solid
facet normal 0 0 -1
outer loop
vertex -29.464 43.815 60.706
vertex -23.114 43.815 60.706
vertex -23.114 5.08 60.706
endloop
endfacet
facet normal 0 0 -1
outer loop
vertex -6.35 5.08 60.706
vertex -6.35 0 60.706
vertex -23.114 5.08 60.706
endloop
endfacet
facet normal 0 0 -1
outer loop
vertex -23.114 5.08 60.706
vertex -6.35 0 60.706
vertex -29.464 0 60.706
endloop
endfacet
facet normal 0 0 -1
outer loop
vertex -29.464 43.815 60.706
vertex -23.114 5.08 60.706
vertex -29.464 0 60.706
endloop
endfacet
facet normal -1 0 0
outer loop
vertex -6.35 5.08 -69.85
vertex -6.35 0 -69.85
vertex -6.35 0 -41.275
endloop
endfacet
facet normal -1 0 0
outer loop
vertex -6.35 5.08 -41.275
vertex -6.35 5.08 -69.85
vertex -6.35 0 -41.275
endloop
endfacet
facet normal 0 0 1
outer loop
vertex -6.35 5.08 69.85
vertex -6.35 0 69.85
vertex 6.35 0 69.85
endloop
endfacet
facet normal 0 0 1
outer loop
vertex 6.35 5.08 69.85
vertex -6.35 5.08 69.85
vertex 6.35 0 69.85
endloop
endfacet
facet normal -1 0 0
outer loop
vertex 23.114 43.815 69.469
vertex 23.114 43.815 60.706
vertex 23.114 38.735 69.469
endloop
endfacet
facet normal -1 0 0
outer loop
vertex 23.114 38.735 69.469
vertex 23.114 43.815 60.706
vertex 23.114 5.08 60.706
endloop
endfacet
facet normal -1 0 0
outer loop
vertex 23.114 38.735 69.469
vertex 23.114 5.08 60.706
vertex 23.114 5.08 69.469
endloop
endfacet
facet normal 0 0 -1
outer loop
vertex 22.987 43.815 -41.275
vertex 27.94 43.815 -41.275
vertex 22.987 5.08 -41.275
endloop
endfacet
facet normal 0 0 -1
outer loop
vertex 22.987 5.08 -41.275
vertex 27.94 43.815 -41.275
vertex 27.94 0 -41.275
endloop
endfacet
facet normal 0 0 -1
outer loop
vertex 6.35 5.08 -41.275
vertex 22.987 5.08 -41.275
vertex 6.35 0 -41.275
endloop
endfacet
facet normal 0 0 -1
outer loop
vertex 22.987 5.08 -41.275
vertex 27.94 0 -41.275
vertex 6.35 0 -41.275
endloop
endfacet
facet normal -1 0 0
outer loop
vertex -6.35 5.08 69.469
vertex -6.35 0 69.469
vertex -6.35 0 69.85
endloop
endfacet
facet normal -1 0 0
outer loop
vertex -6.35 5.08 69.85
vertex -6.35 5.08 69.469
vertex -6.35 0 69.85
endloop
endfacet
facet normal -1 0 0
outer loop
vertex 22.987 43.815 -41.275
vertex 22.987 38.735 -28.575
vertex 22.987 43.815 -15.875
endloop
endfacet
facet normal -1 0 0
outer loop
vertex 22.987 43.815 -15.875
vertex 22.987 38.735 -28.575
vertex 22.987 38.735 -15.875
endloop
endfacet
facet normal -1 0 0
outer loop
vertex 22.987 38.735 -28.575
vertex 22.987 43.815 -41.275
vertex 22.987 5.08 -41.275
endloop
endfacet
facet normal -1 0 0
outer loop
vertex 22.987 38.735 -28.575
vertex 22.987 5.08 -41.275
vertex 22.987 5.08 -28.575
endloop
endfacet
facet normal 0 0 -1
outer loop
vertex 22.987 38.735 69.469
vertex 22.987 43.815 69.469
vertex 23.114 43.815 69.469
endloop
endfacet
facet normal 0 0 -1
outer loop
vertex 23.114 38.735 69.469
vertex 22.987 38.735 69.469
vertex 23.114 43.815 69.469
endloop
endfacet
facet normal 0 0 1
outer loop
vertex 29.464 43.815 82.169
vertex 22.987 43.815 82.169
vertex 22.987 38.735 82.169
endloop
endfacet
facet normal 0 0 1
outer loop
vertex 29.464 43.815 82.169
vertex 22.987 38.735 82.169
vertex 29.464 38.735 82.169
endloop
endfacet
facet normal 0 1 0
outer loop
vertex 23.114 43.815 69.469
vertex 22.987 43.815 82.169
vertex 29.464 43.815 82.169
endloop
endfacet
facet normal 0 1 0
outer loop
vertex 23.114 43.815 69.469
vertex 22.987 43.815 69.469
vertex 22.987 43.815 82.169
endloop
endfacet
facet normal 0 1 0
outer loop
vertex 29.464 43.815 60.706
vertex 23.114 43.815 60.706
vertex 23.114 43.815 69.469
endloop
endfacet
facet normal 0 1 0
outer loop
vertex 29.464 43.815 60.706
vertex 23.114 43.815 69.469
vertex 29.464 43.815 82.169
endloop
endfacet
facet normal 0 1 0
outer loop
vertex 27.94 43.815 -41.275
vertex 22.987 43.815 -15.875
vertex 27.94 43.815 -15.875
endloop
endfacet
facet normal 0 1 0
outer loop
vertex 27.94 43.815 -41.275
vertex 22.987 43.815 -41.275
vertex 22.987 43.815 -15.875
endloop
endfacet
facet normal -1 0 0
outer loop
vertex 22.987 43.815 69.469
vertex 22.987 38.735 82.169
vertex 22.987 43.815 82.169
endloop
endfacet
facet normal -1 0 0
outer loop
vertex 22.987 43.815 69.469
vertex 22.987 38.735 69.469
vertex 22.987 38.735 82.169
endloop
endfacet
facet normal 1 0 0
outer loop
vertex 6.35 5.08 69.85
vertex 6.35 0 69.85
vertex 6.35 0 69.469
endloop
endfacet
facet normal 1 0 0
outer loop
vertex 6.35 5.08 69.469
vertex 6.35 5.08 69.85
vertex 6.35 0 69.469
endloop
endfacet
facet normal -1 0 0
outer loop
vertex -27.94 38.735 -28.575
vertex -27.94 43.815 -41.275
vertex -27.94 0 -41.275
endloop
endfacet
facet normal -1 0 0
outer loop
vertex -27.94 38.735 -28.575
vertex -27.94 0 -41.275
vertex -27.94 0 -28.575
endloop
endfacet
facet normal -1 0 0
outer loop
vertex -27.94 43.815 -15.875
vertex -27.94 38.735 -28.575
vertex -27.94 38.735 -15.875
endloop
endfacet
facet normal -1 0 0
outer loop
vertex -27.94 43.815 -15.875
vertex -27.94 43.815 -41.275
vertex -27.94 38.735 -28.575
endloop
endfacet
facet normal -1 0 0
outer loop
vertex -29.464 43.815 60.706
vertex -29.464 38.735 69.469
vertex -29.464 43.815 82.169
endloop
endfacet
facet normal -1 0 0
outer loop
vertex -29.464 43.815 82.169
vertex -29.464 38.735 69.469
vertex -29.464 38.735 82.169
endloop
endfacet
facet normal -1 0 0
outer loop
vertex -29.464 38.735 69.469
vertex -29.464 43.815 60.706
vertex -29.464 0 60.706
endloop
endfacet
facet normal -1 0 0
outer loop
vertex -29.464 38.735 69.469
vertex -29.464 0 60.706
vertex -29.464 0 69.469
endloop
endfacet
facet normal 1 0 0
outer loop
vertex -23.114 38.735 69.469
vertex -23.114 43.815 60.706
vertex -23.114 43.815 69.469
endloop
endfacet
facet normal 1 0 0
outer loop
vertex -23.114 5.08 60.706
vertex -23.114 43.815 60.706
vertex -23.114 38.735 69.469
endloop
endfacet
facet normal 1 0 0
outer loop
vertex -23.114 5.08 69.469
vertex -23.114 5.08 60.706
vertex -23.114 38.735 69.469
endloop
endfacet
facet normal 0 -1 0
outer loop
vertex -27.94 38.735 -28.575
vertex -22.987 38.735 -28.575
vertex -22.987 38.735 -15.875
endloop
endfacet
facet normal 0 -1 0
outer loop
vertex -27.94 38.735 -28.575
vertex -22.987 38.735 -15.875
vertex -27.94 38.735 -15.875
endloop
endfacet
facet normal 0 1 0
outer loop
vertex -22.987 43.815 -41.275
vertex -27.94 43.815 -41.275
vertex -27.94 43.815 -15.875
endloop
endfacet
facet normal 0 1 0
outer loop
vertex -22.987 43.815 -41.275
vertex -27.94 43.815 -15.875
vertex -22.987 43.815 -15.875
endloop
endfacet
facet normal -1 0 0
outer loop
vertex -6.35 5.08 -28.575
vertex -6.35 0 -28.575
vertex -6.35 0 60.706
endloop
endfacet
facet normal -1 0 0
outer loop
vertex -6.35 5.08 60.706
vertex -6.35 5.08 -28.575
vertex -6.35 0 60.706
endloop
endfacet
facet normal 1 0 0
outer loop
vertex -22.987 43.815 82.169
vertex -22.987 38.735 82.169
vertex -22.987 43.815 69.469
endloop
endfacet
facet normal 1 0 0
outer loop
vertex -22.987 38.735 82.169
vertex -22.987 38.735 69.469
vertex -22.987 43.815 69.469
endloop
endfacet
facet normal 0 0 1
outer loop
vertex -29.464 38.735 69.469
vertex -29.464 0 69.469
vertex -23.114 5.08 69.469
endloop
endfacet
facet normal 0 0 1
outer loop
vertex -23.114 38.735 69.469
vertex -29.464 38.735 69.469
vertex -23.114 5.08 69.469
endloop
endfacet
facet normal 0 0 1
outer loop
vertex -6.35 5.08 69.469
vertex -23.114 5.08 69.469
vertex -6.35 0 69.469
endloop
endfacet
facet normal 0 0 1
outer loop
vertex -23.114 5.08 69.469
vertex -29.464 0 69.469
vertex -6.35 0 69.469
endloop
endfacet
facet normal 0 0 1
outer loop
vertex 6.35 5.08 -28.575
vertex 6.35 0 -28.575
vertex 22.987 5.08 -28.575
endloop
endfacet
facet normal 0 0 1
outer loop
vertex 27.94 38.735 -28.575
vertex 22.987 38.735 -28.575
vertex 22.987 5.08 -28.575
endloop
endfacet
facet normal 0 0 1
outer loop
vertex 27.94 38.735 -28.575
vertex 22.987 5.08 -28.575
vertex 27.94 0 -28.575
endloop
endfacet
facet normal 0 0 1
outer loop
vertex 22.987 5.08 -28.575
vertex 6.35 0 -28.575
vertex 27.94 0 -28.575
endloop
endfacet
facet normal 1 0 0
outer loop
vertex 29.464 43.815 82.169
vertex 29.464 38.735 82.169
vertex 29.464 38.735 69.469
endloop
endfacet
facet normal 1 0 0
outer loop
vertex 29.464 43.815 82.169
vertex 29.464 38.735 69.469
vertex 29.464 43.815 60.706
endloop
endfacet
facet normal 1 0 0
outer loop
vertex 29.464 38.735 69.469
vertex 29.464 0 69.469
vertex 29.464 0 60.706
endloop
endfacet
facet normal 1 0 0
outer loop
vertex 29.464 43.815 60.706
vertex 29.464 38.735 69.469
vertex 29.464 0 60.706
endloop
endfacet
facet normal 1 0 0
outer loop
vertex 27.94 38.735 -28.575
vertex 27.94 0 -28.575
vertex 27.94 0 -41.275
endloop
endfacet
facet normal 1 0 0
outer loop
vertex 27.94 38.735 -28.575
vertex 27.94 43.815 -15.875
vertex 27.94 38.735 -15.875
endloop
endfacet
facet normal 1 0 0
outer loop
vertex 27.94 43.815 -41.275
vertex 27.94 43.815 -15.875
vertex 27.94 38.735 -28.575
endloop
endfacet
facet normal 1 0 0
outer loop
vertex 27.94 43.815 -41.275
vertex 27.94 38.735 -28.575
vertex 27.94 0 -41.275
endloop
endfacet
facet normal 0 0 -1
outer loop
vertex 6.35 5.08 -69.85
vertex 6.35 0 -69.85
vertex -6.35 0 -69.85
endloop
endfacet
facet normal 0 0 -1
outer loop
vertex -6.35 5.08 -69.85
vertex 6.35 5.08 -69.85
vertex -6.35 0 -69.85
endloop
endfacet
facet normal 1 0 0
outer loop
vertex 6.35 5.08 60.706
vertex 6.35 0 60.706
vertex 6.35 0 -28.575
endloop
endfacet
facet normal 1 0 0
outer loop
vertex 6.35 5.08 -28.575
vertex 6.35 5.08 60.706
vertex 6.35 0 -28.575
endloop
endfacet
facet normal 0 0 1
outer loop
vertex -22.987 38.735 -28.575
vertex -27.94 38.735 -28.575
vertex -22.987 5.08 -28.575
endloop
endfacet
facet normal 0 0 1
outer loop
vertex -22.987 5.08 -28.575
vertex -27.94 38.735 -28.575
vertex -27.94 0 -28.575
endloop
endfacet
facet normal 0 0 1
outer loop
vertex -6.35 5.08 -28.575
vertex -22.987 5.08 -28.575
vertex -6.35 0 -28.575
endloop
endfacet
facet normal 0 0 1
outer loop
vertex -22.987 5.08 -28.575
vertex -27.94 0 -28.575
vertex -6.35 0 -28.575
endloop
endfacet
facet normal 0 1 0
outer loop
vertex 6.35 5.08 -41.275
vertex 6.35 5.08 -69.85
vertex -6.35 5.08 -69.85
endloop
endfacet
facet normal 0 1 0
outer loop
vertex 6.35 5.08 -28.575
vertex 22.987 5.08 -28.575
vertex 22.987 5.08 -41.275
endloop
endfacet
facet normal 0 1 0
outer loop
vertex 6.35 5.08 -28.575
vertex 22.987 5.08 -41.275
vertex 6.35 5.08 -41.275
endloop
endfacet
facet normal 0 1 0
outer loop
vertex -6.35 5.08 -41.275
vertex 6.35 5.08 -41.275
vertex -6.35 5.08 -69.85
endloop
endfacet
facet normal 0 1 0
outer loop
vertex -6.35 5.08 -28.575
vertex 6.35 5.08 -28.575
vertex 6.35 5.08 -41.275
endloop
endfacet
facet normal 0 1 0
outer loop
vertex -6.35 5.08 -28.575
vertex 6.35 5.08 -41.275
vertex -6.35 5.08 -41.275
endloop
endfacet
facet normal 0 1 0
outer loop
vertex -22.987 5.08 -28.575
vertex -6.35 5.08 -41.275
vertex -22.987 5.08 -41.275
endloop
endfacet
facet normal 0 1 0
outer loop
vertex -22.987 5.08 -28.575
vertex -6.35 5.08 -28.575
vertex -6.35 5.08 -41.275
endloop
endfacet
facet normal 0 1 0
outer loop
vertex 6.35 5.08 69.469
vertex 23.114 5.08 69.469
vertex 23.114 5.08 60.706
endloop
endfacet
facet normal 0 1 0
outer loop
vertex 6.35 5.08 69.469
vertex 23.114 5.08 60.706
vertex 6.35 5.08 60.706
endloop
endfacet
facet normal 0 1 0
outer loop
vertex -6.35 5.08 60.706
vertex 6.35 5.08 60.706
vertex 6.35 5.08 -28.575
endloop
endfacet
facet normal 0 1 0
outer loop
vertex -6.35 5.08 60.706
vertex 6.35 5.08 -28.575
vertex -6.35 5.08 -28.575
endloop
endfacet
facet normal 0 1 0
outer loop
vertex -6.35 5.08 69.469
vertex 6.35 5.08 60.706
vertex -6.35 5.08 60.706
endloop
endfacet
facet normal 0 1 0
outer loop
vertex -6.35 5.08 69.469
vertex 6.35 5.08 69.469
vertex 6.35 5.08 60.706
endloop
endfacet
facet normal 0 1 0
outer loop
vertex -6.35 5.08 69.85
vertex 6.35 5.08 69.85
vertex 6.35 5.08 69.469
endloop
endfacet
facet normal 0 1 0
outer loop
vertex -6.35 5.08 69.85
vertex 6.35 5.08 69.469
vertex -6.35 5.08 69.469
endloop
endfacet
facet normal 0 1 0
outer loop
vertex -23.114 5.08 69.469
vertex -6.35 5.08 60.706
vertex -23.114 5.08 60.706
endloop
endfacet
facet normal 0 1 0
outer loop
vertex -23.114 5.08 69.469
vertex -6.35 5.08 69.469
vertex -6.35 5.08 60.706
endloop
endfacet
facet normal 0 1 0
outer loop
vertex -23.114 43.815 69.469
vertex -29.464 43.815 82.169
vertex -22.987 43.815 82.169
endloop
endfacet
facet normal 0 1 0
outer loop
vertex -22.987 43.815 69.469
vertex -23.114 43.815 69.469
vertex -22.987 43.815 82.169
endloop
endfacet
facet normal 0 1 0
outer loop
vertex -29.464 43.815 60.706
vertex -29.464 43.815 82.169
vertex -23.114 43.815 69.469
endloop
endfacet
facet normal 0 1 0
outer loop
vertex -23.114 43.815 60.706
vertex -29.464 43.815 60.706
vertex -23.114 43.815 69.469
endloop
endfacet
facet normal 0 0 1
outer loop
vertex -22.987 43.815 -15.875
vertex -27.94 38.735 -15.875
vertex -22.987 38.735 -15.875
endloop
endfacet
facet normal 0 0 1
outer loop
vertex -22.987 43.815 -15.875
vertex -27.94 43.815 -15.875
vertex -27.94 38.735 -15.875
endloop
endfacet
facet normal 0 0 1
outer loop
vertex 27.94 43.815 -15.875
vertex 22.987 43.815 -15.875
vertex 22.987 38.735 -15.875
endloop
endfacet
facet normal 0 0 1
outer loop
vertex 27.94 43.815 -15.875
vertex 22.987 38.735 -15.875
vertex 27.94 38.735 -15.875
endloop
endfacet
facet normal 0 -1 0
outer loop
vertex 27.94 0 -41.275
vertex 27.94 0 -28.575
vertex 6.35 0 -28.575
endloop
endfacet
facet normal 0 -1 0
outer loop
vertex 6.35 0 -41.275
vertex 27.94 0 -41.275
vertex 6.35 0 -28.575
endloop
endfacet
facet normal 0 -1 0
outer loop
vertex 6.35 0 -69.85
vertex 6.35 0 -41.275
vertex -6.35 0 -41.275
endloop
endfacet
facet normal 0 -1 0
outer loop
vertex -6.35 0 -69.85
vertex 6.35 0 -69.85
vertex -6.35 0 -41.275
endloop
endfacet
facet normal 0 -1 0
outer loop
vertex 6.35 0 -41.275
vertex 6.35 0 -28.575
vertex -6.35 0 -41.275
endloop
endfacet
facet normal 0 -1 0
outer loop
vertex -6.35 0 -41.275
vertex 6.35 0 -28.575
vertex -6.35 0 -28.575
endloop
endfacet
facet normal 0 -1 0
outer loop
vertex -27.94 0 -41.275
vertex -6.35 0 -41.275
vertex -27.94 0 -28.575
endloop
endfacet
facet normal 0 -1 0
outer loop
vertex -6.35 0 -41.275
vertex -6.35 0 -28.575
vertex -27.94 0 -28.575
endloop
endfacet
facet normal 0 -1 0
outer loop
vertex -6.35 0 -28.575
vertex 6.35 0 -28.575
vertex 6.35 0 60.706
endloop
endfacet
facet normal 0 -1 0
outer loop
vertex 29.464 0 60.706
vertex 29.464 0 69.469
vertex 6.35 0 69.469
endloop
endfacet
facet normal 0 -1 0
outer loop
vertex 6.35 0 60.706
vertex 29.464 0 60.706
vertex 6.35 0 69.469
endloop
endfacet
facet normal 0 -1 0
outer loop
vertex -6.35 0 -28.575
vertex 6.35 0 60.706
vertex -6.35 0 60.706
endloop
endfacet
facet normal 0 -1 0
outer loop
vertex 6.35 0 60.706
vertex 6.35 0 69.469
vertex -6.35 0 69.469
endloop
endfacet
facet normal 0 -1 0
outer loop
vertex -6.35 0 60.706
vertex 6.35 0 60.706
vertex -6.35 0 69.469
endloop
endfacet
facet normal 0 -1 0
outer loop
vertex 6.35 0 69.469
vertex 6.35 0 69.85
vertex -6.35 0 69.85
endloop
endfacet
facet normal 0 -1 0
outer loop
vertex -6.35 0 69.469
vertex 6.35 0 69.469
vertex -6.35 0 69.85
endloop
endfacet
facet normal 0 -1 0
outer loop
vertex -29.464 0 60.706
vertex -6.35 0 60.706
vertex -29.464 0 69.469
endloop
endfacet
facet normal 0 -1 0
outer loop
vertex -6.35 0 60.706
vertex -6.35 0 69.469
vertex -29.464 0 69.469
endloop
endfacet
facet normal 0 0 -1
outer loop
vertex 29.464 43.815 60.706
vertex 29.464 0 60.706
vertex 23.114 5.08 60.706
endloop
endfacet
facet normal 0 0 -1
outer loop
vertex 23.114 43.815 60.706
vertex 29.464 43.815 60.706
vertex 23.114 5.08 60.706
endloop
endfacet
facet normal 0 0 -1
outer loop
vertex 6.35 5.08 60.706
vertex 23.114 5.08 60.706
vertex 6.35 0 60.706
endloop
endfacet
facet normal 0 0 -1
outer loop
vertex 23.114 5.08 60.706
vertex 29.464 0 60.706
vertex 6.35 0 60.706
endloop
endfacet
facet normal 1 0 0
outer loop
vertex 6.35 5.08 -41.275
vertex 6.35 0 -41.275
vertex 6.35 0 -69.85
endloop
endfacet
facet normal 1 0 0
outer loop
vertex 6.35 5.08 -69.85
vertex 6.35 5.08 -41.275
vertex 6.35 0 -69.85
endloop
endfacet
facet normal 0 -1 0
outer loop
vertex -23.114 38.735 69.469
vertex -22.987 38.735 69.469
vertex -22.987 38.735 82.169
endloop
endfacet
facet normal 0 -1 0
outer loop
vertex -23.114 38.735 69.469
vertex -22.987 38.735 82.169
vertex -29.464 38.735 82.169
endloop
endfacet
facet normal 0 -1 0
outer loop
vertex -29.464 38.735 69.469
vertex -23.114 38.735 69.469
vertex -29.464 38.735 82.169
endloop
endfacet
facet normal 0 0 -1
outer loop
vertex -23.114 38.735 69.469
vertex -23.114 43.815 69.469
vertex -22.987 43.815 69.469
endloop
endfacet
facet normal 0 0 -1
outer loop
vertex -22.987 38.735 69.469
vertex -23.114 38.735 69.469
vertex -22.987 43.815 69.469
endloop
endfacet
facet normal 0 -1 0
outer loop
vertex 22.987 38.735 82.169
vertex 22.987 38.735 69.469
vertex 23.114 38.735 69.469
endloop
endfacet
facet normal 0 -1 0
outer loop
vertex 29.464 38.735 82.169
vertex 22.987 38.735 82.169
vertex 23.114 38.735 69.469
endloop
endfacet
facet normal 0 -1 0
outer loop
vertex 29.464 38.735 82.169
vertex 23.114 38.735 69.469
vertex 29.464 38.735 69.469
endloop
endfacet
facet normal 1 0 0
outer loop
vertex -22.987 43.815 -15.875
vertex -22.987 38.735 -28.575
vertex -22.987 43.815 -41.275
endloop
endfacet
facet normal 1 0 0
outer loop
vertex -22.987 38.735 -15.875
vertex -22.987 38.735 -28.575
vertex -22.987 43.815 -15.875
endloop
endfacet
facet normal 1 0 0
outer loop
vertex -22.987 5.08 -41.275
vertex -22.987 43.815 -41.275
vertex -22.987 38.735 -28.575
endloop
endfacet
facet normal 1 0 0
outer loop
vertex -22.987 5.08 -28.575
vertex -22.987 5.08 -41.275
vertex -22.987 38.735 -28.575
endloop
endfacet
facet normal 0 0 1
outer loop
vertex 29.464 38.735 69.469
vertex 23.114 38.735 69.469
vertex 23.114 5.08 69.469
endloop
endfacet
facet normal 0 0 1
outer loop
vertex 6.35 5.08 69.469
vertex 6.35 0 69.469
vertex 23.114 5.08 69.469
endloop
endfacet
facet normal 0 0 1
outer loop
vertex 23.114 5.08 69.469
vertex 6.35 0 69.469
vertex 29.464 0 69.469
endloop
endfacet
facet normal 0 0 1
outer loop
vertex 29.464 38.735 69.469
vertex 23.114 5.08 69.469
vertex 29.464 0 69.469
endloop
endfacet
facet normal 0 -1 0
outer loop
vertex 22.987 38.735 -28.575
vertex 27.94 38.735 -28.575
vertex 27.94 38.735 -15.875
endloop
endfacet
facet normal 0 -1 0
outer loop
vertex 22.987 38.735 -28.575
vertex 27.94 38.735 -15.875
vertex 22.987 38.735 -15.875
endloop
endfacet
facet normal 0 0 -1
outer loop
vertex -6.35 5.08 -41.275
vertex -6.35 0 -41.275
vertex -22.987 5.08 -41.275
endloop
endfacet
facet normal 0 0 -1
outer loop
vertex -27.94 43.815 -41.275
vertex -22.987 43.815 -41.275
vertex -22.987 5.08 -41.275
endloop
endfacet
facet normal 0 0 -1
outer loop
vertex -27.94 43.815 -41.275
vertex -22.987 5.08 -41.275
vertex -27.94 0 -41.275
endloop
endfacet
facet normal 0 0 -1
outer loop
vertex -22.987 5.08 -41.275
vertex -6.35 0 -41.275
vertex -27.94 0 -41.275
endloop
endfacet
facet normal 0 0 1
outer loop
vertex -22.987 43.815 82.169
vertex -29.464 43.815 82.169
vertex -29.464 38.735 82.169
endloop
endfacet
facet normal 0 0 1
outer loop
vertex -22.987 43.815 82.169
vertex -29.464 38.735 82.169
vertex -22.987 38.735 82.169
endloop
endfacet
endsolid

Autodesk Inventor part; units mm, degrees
ref_plane "YZ Plane" through (0, 0, 0) normal (1, 0, 0) x (0, 1, 0)
ref_plane "XZ Plane" through (0, 0, 0) normal (0, 1, 0) x (-1, 0, 0)
ref_plane "XY Plane" through (0, 0, 0) normal (0, 0, 1) x (1, 0, 0)
sketch "Sketch1" plane through (0, 0, 0) normal (0, 1, 0) x (-1, 0, 0)
  line L0 (23.114, 69.469) -> (-23.114, 69.469)
  line L1 (-23.114, 69.469) -> (-23.114, -69.469)
  line L2 (-23.114, -69.469) -> (23.114, -69.469)
  line L3 (23.114, -69.469) -> (23.114, 69.469)
  line L4 (23.114, 69.469) -> (-23.114, -69.469) construction
  line L5 (-23.114, 69.469) -> (23.114, -69.469) construction
  line L6 (-29.464, 60.706) -> (29.464, 60.706)
  line L7 (29.464, 60.706) -> (29.464, 69.469)
  line L8 (29.464, 69.469) -> (-29.464, 69.469)
  line L9 (-29.464, 69.469) -> (-29.464, 60.706)
  line L10 (-29.464, 60.706) -> (29.464, 69.469) construction
  line L11 (29.464, 60.706) -> (-29.464, 69.469) construction
  line L12 (6.35, 69.85) -> (-6.35, 69.85)
  line L13 (-6.35, 69.85) -> (-6.35, -69.85)
  line L14 (-6.35, -69.85) -> (6.35, -69.85)
  line L15 (6.35, -69.85) -> (6.35, 69.85)
  line L16 (6.35, 69.85) -> (-6.35, -69.85) construction
  line L17 (-6.35, 69.85) -> (6.35, -69.85) construction
  point P0 (0, 0)
  point P1 (0, 65.0875)
  dimension "d0" = 46.228
  dimension "d1" = 138.938
  dimension "d2" = 58.928
sketch "Sketch2" plane through (0, 0, 0) normal (0, 1, 0) x (-1, 0, 0)
  line L0 (-9.525, 69.85) -> (-9.525, -28.575)
  line L1 (-38.1, -41.275) -> (38.1, -41.275)
  line L2 (38.1, -41.275) -> (38.1, -28.575)
  line L3 (38.1, -28.575) -> (-38.1, -28.575)
  line L4 (-38.1, -28.575) -> (-38.1, -41.275)
  line L5 (-38.1, -41.275) -> (38.1, -28.575) construction
  line L6 (38.1, -41.275) -> (-38.1, -28.575) construction
  point P0 (0, 0)
  point P1 (0, -34.925)
  dimension "d3" = 98.425
  dimension "d4" = 76.2
extrude "Extrusion1" add sketch "Sketch2" along normal blind 5.08
extrude "Extrusion2" add sketch "Sketch1" along normal blind 5.08 contours L3 L6 L15 L0 | L8 L7 L6 L3 | L15 L6 L13 L0 | L0 L13 L12 L15 | L13 L6 L1 L0 | L15 L2 L13 L6 | L1 L6 L9 L8 | L15 L14 L13 L2
sketch "Sketch3" plane through (0, 5.08, 0) normal (0, 1, 0) x (1, 0, 0)
  line L0 (-29.464, -60.706) -> (-29.464, -69.469) projected
  line L1 (-29.464, -69.469) -> (-6.35, -69.469) projected
  line L2 (-29.464, -60.706) -> (-23.114, -60.706)
  line L3 (-23.114, -60.706) -> (-23.114, -69.469)
  line L4 (-23.114, -69.469) -> (-29.464, -69.469)
  line L5 (-29.464, -69.469) -> (-29.464, -60.706)
  line L6 (29.464, -69.469) -> (29.464, -60.706) projected
  line L7 (6.35, -69.469) -> (29.464, -69.469) projected
  line L8 (29.464, -60.706) -> (23.114, -60.706)
  line L9 (23.114, -60.706) -> (23.114, -69.469)
  line L10 (23.114, -69.469) -> (29.464, -69.469)
  line L11 (29.464, -69.469) -> (29.464, -60.706)
  point P0 (0, 0)
  dimension "d9" = 6.35
  dimension "d10" = 6.35
extrude "Extrusion3" add sketch "Sketch3" along normal blind 38.735
sketch "Sketch4" plane through (0, 5.08, 0) normal (0, 1, 0) x (1, 0, 0)
  line L0 (-38.1, 41.275) -> (-38.1, 28.575) projected
  line L1 (-38.1, 28.575) -> (-6.35, 28.575) projected
  line L2 (-38.1, 41.275) -> (-22.987, 41.275)
  line L3 (-22.987, 41.275) -> (-22.987, 28.575)
  line L4 (-22.987, 28.575) -> (-38.1, 28.575)
  line L5 (-38.1, 28.575) -> (-38.1, 41.275)
  line L6 (38.1, 28.575) -> (38.1, 41.275) projected
  line L7 (6.35, 28.575) -> (38.1, 28.575) projected
  line L8 (38.1, 41.275) -> (22.987, 41.275)
  line L9 (22.987, 41.275) -> (22.987, 28.575)
  line L10 (22.987, 28.575) -> (38.1, 28.575)
  line L11 (38.1, 28.575) -> (38.1, 41.275)
  point P0 (0, 0)
  dimension "d13" = 15.113
  dimension "d14" = 15.113
extrude "Extrusion4" add sketch "Sketch4" along normal blind 38.735
sketch "Sketch5" plane through (-38.1, 0, -41.275) normal (-1, 0, 0) x (0, 0, 1)
  line L0 (-6.35, 53.975) -> (19.05, 53.975)
  line L1 (19.05, 53.975) -> (19.05, -3.175)
  line L2 (19.05, -3.175) -> (-6.35, -3.175)
  line L3 (-6.35, -3.175) -> (-6.35, 53.975)
  line L4 (-6.35, 53.975) -> (19.05, -3.175) construction
  line L5 (19.05, 53.975) -> (-6.35, -3.175) construction
  point P0 (41.275, 0)
  point P1 (6.35, 25.4)
extrude "Extrusion5" cut sketch "Sketch5" against normal blind 10.16
sketch "Sketch6" plane through (6.35, 0, -28.575) normal (0, 0, 1) x (1, 0, 0)
  point P0 (-6.35, 0)
sketch "Sketch7" plane through (38.1, 0, -28.575) normal (1, 0, 0) x (0, 0, -1)
  line L0 (-1.5875, 49.2125) -> (17.4625, 49.2125)
  line L1 (17.4625, 49.2125) -> (17.4625, -4.7625)
  line L2 (17.4625, -4.7625) -> (-1.5875, -4.7625)
  line L3 (-1.5875, -4.7625) -> (-1.5875, 49.2125)
  line L4 (-1.5875, 49.2125) -> (17.4625, -4.7625) construction
  line L5 (17.4625, 49.2125) -> (-1.5875, -4.7625) construction
  point P0 (-28.575, 0)
  point P1 (7.9375, 22.225)
extrude "Extrusion6" cut sketch "Sketch7" against normal blind 10.16
sketch "Sketch8" plane through (-29.464, 0, 69.469) normal (0, 0, 1) x (1, 0, 0)
  line L0 (0, 0) -> (0, 43.815) projected
  line L1 (6.477, 5.08) -> (6.477, 43.815) projected
  line L2 (0, 43.815) -> (6.477, 43.815)
  line L3 (6.477, 43.815) -> (6.477, 38.735)
  line L4 (6.477, 38.735) -> (0, 38.735)
  line L5 (0, 38.735) -> (0, 43.815)
  line L6 (58.928, 0) -> (58.928, 43.815) projected
  line L7 (52.451, 5.08) -> (52.451, 43.815) projected
  line L8 (58.928, 43.815) -> (52.451, 43.815)
  line L9 (52.451, 43.815) -> (52.451, 38.735)
  line L10 (52.451, 38.735) -> (58.928, 38.735)
  line L11 (58.928, 38.735) -> (58.928, 43.815)
  point P0 (29.464, 0)
  dimension "d21" = 5.08
extrude "Extrusion7" add sketch "Sketch8" along normal blind 12.7
sketch "Sketch9" plane through (6.35, 0, -28.575) normal (0, 0, 1) x (1, 0, 0)
  line L0 (16.637, 5.08) -> (16.637, 43.815) projected
  line L1 (21.59, 43.815) -> (21.59, 0) projected
  line L2 (16.637, 43.815) -> (21.59, 43.815)
  line L3 (21.59, 43.815) -> (21.59, 38.735)
  line L4 (21.59, 38.735) -> (16.637, 38.735)
  line L5 (16.637, 38.735) -> (16.637, 43.815)
  line L6 (-34.29, 43.815) -> (-34.29, 0) projected
  line L7 (-29.337, 5.08) -> (-29.337, 43.815) projected
  line L8 (-34.29, 43.815) -> (-29.337, 43.815)
  line L9 (-29.337, 43.815) -> (-29.337, 38.735)
  line L10 (-29.337, 38.735) -> (-34.29, 38.735)
  line L11 (-34.29, 38.735) -> (-34.29, 43.815)
  point P0 (-6.35, 0)
  dimension "d24" = 5.08
extrude "Extrusion8" add sketch "Sketch9" along normal blind 12.7
properties part number "battery"
